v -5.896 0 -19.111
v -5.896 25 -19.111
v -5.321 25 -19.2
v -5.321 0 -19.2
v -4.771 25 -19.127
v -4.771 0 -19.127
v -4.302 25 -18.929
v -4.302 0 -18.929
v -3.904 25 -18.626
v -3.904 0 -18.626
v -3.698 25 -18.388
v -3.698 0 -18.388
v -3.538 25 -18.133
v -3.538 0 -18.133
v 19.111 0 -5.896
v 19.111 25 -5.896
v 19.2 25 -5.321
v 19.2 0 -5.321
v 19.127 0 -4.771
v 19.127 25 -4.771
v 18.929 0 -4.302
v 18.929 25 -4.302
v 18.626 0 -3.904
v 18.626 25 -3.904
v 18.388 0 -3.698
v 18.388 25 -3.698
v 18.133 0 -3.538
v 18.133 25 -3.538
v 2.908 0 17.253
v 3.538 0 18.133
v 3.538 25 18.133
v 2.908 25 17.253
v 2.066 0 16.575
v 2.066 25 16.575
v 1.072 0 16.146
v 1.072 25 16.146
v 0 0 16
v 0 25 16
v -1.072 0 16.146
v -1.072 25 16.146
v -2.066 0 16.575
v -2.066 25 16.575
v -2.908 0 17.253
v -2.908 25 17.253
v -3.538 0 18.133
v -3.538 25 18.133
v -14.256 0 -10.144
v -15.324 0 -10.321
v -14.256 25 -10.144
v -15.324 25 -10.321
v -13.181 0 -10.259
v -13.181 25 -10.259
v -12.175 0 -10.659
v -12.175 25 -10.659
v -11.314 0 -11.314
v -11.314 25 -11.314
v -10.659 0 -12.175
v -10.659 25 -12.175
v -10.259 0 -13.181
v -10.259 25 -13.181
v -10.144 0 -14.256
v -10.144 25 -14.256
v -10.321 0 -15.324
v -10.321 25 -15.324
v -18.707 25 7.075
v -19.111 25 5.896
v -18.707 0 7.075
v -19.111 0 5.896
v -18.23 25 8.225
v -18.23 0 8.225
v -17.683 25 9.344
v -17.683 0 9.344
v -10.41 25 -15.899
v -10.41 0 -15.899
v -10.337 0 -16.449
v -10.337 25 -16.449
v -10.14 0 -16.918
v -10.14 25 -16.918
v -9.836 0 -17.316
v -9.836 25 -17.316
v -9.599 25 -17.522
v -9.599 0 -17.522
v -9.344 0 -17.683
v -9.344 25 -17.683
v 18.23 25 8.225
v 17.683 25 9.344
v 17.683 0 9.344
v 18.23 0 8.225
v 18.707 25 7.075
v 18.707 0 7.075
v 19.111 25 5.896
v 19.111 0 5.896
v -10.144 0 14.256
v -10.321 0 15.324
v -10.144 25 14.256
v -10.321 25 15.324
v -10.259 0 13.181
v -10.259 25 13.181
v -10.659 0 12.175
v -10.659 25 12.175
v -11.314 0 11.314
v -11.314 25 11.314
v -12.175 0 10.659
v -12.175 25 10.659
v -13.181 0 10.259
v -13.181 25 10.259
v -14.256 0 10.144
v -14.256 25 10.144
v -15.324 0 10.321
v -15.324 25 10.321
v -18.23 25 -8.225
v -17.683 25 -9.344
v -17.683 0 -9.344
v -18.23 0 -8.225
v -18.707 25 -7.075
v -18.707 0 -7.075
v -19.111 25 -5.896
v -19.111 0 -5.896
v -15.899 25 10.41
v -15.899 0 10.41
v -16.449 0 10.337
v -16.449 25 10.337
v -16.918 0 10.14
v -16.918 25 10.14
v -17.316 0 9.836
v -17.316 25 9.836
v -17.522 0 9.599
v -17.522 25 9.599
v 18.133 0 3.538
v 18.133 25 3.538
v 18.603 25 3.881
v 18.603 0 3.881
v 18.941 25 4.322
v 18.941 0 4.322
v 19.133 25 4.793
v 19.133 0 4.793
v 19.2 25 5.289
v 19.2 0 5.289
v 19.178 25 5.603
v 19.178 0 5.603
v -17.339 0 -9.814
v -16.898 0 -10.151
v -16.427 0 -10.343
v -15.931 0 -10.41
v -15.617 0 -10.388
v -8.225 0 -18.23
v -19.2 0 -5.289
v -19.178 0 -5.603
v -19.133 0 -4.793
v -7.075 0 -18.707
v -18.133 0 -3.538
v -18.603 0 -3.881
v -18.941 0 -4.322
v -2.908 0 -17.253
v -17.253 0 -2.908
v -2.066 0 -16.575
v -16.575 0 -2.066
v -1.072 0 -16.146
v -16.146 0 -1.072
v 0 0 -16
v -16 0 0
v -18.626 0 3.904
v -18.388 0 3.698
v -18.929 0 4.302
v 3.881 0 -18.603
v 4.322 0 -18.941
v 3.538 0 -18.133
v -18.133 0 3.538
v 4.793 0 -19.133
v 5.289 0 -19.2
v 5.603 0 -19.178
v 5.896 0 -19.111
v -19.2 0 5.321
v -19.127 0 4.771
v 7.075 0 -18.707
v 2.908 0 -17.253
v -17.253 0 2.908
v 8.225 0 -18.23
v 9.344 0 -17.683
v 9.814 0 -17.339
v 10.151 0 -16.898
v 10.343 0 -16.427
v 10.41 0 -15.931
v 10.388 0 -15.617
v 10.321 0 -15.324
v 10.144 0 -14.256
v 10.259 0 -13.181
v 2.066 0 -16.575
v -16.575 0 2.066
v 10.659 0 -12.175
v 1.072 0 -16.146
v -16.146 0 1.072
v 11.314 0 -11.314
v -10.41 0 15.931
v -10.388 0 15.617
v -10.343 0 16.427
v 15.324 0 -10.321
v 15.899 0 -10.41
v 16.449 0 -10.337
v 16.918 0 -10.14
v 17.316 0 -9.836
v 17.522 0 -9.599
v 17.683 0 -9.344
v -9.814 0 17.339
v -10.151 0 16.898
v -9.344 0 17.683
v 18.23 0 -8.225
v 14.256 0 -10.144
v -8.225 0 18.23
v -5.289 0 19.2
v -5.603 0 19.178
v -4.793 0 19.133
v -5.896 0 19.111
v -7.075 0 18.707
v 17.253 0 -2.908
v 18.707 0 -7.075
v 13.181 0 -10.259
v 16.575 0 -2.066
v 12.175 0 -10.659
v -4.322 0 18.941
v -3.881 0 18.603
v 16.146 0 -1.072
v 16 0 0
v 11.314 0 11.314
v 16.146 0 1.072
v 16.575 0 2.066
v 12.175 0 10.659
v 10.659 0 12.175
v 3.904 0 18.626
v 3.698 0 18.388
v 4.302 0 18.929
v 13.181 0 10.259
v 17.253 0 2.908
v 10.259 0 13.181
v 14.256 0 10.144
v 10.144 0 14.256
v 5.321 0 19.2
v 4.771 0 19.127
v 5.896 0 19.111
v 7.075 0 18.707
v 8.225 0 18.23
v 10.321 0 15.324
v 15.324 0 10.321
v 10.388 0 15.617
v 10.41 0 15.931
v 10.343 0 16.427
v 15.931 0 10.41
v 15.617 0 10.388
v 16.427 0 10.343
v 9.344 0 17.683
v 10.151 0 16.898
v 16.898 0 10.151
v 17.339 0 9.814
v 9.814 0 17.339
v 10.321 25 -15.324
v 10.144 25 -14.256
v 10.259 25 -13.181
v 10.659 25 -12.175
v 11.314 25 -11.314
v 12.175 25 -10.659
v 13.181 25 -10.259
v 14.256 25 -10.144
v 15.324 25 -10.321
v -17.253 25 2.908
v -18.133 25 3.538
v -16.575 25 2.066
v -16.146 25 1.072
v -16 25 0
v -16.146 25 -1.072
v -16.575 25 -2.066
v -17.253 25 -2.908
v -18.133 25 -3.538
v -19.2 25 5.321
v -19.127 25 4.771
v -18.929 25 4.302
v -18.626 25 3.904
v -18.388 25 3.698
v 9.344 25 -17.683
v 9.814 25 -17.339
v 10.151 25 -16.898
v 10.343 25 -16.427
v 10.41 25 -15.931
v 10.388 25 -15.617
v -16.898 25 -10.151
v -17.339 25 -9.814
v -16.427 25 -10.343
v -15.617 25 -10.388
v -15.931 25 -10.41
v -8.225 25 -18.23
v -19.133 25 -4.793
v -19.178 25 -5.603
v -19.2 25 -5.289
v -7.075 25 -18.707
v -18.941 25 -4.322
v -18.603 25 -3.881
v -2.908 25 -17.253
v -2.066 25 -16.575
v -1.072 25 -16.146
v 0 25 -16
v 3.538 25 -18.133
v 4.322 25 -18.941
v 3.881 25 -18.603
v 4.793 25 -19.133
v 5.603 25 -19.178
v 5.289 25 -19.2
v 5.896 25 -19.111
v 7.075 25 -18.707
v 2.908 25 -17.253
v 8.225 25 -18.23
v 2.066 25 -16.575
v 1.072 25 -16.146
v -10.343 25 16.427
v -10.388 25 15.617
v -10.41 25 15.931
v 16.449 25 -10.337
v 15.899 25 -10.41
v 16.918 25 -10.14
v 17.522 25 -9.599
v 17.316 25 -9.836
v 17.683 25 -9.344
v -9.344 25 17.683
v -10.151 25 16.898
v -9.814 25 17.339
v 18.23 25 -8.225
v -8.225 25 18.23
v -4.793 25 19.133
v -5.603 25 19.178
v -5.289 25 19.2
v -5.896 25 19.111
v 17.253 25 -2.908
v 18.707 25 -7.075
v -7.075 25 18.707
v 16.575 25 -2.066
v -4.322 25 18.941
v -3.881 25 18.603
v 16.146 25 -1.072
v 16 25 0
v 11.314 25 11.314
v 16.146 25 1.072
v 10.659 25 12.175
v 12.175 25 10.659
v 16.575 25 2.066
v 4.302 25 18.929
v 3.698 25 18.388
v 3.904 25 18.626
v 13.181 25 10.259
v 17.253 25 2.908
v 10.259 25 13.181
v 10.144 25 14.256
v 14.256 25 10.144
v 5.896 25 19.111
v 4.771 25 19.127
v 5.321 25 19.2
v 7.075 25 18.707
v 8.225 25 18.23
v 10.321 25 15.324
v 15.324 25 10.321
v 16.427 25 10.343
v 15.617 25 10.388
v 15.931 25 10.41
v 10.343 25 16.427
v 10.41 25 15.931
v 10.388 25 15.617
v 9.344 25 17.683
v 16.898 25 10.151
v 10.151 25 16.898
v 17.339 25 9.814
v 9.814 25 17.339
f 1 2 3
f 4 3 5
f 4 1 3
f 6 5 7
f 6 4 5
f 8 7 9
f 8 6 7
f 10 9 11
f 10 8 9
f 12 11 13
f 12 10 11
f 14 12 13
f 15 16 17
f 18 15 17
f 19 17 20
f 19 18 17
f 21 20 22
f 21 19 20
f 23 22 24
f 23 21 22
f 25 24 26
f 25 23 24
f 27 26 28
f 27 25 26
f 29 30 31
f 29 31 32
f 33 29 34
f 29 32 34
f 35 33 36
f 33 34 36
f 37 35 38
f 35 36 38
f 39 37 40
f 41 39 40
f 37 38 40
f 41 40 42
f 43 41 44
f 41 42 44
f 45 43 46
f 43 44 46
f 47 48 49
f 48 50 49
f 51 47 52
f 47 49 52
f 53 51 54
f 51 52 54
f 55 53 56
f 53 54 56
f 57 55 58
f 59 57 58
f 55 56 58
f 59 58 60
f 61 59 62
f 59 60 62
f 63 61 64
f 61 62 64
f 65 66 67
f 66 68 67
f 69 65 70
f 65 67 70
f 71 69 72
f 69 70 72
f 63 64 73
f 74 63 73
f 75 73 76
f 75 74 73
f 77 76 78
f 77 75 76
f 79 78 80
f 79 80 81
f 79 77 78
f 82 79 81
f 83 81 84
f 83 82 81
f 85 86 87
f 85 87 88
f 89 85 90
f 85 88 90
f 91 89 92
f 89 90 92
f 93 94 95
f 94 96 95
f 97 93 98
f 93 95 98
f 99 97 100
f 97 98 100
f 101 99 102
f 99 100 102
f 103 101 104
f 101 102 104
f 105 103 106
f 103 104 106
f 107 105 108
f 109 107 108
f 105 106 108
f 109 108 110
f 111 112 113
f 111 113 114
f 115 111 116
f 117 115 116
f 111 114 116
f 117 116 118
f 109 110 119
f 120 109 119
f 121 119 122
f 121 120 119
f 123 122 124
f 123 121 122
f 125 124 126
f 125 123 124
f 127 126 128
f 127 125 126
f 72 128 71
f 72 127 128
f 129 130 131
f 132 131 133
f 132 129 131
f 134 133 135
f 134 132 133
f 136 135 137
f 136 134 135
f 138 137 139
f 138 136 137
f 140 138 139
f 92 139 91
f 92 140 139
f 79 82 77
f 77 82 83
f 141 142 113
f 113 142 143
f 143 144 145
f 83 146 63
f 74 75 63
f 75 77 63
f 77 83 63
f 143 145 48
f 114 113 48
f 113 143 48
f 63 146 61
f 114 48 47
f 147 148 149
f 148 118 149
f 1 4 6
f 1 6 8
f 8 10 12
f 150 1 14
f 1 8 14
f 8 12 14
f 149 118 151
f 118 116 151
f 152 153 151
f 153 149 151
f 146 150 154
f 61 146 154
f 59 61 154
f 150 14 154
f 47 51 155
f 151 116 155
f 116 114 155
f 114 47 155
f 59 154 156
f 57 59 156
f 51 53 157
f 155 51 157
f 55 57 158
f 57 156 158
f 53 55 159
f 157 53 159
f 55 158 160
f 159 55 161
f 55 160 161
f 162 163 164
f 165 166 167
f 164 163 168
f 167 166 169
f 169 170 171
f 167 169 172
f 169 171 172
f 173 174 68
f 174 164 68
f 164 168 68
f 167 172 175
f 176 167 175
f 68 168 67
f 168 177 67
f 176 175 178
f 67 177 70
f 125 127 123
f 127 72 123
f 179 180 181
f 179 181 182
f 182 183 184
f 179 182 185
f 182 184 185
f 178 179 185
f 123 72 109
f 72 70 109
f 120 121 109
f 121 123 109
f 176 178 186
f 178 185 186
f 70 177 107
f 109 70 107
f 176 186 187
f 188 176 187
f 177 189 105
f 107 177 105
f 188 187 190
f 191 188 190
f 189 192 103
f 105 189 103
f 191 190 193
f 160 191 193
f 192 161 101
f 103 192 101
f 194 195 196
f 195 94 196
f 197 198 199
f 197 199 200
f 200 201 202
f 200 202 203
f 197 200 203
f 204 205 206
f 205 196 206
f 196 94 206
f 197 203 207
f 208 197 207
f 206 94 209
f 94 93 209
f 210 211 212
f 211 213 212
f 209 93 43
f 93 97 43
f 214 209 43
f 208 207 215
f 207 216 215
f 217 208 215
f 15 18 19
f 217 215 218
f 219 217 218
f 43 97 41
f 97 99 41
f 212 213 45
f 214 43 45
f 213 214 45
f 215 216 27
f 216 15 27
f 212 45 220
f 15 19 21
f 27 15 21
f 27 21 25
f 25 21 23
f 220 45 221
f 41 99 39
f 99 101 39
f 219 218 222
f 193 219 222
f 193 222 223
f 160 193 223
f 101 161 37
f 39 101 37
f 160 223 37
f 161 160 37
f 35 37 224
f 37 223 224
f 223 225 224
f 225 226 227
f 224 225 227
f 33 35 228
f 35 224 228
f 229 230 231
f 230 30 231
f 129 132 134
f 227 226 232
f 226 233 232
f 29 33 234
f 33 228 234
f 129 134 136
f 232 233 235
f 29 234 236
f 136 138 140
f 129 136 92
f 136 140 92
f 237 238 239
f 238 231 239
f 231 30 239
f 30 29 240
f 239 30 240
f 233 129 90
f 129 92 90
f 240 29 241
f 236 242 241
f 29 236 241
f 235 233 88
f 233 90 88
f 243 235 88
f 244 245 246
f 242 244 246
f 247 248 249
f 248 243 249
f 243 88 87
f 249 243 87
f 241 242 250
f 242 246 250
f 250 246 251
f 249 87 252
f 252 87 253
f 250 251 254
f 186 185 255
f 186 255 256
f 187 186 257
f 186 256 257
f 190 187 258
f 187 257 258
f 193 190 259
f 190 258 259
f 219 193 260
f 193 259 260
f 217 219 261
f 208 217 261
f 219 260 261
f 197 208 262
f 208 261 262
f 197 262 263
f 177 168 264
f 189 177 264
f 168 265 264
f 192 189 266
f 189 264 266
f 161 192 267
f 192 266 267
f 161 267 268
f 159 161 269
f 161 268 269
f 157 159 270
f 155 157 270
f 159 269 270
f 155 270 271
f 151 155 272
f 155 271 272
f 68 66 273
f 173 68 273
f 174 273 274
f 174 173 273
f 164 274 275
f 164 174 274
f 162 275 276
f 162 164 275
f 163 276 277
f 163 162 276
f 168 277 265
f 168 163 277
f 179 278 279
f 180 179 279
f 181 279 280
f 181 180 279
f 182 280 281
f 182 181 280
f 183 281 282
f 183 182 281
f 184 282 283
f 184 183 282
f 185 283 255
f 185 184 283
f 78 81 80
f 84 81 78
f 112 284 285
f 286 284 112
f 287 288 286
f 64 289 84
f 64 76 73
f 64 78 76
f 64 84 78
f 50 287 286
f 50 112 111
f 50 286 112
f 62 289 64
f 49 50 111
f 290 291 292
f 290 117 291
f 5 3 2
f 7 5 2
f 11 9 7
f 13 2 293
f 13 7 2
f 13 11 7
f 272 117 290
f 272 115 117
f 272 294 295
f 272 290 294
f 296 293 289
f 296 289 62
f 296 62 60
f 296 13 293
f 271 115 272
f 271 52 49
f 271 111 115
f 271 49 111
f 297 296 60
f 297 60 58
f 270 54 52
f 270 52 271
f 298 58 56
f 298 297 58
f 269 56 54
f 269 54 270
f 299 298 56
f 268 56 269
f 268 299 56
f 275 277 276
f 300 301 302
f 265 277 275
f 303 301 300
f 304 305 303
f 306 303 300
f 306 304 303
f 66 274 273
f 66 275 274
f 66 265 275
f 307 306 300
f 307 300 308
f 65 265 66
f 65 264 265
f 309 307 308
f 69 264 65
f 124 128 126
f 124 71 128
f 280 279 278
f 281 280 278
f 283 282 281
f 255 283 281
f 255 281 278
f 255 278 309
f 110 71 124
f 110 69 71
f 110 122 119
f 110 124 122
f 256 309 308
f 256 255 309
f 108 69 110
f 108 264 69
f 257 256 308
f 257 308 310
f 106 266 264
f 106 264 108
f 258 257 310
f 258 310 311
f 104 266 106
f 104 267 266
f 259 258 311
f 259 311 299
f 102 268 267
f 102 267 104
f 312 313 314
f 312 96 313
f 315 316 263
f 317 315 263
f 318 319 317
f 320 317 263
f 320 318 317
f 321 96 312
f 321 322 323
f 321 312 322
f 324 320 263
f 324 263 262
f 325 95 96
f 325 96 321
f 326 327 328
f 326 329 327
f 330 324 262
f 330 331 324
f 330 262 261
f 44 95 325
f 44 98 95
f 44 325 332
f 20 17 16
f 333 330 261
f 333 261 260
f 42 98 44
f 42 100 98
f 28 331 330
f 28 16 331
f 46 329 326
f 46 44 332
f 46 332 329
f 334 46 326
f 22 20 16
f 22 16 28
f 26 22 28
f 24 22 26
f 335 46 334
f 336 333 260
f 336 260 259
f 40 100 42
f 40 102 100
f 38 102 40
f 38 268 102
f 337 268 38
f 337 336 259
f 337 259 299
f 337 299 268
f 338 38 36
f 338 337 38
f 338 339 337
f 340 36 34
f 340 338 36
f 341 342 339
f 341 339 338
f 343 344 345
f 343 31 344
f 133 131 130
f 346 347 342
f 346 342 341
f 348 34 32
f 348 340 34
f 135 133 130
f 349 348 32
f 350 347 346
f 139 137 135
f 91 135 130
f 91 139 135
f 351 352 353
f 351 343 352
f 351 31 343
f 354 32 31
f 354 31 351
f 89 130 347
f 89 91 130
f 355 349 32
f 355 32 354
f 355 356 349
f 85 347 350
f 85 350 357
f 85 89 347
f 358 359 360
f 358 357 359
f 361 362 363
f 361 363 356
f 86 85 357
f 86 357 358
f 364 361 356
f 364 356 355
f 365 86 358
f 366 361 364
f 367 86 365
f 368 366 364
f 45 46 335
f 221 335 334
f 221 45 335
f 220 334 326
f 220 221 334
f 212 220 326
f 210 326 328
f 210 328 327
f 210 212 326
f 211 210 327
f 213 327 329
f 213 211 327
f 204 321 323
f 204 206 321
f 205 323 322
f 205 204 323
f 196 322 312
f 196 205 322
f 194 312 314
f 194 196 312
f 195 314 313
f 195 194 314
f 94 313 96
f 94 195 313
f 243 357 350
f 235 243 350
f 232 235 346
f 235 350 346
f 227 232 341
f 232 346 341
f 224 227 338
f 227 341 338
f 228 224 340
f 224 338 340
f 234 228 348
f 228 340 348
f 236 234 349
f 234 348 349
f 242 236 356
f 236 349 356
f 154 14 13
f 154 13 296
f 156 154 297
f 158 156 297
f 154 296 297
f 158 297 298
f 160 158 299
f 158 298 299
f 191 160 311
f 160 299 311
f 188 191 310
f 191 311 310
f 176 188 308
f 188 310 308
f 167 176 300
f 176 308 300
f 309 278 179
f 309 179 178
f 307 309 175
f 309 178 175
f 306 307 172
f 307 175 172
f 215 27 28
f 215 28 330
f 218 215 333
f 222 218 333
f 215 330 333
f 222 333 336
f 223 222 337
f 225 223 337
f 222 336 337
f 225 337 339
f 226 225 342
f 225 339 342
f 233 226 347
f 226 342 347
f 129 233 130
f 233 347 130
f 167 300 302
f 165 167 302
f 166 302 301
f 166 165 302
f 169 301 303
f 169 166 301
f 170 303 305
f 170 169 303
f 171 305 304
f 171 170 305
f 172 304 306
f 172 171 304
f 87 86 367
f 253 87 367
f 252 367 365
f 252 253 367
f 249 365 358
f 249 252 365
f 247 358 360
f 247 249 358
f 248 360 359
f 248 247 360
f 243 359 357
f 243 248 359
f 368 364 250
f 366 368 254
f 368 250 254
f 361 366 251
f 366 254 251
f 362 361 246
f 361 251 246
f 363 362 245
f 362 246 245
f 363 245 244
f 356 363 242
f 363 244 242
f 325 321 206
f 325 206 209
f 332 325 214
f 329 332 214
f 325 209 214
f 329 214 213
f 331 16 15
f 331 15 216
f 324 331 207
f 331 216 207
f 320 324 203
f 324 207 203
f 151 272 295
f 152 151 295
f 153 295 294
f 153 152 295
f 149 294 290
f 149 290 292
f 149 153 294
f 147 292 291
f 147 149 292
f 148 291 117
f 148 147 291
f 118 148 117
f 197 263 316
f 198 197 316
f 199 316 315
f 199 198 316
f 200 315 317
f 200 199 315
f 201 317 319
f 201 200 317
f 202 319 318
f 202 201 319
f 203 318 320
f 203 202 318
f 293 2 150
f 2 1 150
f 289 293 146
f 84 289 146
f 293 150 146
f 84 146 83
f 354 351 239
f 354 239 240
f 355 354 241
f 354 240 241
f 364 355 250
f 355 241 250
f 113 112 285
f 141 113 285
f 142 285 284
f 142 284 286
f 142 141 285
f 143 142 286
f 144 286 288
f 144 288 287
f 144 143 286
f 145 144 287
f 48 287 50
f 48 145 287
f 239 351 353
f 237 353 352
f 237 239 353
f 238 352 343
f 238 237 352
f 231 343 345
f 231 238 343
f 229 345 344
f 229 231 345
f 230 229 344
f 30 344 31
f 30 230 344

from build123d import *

# Parameters (mm, degrees)
SKETCH1_R           = 20
BOSS_EXTRUDE1_DEPTH = 25
SKETCH2_R           = 4
CUT_EXTRUDE1_DEPTH  = 25
FILLET1_R           = 2


with BuildPart() as part:
    # Sketch1 → Boss-Extrude1 (new body)
    with BuildSketch(Plane(origin=(0, 0, 0), x_dir=(1, 0, 0), z_dir=(0, 1, 0))):
        with Locations(Location((0, 0, 0), (0, 0, 270))):
            Circle(SKETCH1_R)
    extrude(amount=BOSS_EXTRUDE1_DEPTH)

    # Sketch2 → Cut-Extrude1 (cut)
    with BuildSketch(Plane(origin=(0, 25, 0), x_dir=(1, 0, 0), z_dir=(0, 1, 0))):
        with Locations((0, 20)):
            Circle(SKETCH2_R)
        with Locations((14.142135624, 14.142135624)):
            Circle(SKETCH2_R)
        with Locations((20, 0)):
            Circle(SKETCH2_R)
        with Locations((14.142135624, -14.142135624)):
            Circle(SKETCH2_R)
        with Locations((0, -20)):
            Circle(SKETCH2_R)
        with Locations((-14.142135624, -14.142135624)):
            Circle(SKETCH2_R)
        with Locations((-20, 0)):
            Circle(SKETCH2_R)
        with Locations((-14.142135624, 14.142135624)):
            Circle(SKETCH2_R)
    extrude(amount=-CUT_EXTRUDE1_DEPTH, mode=Mode.SUBTRACT)

    # Fillet1
    fillet1_edges = [part.edges().sort_by_distance(p)[0] for p in [
        (16.673542367, 12.5, -11.045043455),
        (11.045043455, 12.5, -16.673542367),
        (19.6, 12.5, 3.979949748),
        (19.6, 12.5, -3.979949748),
        (11.045043455, 12.5, 16.673542367),
        (16.673542367, 12.5, 11.045043455),
        (-3.979949748, 12.5, 19.6),
        (3.979949748, 12.5, 19.6),
        (-16.673542367, 12.5, 11.045043455),
        (-11.045043455, 12.5, 16.673542367),
        (-19.6, 12.5, -3.979949748),
        (-19.6, 12.5, 3.979949748),
        (-11.045043455, 12.5, -16.673542367),
        (-16.673542367, 12.5, -11.045043455),
        (3.979949748, 12.5, -19.6),
        (-3.979949748, 12.5, -19.6),
    ]]
    fillet(fillet1_edges, radius=FILLET1_R)


solid = part.part
